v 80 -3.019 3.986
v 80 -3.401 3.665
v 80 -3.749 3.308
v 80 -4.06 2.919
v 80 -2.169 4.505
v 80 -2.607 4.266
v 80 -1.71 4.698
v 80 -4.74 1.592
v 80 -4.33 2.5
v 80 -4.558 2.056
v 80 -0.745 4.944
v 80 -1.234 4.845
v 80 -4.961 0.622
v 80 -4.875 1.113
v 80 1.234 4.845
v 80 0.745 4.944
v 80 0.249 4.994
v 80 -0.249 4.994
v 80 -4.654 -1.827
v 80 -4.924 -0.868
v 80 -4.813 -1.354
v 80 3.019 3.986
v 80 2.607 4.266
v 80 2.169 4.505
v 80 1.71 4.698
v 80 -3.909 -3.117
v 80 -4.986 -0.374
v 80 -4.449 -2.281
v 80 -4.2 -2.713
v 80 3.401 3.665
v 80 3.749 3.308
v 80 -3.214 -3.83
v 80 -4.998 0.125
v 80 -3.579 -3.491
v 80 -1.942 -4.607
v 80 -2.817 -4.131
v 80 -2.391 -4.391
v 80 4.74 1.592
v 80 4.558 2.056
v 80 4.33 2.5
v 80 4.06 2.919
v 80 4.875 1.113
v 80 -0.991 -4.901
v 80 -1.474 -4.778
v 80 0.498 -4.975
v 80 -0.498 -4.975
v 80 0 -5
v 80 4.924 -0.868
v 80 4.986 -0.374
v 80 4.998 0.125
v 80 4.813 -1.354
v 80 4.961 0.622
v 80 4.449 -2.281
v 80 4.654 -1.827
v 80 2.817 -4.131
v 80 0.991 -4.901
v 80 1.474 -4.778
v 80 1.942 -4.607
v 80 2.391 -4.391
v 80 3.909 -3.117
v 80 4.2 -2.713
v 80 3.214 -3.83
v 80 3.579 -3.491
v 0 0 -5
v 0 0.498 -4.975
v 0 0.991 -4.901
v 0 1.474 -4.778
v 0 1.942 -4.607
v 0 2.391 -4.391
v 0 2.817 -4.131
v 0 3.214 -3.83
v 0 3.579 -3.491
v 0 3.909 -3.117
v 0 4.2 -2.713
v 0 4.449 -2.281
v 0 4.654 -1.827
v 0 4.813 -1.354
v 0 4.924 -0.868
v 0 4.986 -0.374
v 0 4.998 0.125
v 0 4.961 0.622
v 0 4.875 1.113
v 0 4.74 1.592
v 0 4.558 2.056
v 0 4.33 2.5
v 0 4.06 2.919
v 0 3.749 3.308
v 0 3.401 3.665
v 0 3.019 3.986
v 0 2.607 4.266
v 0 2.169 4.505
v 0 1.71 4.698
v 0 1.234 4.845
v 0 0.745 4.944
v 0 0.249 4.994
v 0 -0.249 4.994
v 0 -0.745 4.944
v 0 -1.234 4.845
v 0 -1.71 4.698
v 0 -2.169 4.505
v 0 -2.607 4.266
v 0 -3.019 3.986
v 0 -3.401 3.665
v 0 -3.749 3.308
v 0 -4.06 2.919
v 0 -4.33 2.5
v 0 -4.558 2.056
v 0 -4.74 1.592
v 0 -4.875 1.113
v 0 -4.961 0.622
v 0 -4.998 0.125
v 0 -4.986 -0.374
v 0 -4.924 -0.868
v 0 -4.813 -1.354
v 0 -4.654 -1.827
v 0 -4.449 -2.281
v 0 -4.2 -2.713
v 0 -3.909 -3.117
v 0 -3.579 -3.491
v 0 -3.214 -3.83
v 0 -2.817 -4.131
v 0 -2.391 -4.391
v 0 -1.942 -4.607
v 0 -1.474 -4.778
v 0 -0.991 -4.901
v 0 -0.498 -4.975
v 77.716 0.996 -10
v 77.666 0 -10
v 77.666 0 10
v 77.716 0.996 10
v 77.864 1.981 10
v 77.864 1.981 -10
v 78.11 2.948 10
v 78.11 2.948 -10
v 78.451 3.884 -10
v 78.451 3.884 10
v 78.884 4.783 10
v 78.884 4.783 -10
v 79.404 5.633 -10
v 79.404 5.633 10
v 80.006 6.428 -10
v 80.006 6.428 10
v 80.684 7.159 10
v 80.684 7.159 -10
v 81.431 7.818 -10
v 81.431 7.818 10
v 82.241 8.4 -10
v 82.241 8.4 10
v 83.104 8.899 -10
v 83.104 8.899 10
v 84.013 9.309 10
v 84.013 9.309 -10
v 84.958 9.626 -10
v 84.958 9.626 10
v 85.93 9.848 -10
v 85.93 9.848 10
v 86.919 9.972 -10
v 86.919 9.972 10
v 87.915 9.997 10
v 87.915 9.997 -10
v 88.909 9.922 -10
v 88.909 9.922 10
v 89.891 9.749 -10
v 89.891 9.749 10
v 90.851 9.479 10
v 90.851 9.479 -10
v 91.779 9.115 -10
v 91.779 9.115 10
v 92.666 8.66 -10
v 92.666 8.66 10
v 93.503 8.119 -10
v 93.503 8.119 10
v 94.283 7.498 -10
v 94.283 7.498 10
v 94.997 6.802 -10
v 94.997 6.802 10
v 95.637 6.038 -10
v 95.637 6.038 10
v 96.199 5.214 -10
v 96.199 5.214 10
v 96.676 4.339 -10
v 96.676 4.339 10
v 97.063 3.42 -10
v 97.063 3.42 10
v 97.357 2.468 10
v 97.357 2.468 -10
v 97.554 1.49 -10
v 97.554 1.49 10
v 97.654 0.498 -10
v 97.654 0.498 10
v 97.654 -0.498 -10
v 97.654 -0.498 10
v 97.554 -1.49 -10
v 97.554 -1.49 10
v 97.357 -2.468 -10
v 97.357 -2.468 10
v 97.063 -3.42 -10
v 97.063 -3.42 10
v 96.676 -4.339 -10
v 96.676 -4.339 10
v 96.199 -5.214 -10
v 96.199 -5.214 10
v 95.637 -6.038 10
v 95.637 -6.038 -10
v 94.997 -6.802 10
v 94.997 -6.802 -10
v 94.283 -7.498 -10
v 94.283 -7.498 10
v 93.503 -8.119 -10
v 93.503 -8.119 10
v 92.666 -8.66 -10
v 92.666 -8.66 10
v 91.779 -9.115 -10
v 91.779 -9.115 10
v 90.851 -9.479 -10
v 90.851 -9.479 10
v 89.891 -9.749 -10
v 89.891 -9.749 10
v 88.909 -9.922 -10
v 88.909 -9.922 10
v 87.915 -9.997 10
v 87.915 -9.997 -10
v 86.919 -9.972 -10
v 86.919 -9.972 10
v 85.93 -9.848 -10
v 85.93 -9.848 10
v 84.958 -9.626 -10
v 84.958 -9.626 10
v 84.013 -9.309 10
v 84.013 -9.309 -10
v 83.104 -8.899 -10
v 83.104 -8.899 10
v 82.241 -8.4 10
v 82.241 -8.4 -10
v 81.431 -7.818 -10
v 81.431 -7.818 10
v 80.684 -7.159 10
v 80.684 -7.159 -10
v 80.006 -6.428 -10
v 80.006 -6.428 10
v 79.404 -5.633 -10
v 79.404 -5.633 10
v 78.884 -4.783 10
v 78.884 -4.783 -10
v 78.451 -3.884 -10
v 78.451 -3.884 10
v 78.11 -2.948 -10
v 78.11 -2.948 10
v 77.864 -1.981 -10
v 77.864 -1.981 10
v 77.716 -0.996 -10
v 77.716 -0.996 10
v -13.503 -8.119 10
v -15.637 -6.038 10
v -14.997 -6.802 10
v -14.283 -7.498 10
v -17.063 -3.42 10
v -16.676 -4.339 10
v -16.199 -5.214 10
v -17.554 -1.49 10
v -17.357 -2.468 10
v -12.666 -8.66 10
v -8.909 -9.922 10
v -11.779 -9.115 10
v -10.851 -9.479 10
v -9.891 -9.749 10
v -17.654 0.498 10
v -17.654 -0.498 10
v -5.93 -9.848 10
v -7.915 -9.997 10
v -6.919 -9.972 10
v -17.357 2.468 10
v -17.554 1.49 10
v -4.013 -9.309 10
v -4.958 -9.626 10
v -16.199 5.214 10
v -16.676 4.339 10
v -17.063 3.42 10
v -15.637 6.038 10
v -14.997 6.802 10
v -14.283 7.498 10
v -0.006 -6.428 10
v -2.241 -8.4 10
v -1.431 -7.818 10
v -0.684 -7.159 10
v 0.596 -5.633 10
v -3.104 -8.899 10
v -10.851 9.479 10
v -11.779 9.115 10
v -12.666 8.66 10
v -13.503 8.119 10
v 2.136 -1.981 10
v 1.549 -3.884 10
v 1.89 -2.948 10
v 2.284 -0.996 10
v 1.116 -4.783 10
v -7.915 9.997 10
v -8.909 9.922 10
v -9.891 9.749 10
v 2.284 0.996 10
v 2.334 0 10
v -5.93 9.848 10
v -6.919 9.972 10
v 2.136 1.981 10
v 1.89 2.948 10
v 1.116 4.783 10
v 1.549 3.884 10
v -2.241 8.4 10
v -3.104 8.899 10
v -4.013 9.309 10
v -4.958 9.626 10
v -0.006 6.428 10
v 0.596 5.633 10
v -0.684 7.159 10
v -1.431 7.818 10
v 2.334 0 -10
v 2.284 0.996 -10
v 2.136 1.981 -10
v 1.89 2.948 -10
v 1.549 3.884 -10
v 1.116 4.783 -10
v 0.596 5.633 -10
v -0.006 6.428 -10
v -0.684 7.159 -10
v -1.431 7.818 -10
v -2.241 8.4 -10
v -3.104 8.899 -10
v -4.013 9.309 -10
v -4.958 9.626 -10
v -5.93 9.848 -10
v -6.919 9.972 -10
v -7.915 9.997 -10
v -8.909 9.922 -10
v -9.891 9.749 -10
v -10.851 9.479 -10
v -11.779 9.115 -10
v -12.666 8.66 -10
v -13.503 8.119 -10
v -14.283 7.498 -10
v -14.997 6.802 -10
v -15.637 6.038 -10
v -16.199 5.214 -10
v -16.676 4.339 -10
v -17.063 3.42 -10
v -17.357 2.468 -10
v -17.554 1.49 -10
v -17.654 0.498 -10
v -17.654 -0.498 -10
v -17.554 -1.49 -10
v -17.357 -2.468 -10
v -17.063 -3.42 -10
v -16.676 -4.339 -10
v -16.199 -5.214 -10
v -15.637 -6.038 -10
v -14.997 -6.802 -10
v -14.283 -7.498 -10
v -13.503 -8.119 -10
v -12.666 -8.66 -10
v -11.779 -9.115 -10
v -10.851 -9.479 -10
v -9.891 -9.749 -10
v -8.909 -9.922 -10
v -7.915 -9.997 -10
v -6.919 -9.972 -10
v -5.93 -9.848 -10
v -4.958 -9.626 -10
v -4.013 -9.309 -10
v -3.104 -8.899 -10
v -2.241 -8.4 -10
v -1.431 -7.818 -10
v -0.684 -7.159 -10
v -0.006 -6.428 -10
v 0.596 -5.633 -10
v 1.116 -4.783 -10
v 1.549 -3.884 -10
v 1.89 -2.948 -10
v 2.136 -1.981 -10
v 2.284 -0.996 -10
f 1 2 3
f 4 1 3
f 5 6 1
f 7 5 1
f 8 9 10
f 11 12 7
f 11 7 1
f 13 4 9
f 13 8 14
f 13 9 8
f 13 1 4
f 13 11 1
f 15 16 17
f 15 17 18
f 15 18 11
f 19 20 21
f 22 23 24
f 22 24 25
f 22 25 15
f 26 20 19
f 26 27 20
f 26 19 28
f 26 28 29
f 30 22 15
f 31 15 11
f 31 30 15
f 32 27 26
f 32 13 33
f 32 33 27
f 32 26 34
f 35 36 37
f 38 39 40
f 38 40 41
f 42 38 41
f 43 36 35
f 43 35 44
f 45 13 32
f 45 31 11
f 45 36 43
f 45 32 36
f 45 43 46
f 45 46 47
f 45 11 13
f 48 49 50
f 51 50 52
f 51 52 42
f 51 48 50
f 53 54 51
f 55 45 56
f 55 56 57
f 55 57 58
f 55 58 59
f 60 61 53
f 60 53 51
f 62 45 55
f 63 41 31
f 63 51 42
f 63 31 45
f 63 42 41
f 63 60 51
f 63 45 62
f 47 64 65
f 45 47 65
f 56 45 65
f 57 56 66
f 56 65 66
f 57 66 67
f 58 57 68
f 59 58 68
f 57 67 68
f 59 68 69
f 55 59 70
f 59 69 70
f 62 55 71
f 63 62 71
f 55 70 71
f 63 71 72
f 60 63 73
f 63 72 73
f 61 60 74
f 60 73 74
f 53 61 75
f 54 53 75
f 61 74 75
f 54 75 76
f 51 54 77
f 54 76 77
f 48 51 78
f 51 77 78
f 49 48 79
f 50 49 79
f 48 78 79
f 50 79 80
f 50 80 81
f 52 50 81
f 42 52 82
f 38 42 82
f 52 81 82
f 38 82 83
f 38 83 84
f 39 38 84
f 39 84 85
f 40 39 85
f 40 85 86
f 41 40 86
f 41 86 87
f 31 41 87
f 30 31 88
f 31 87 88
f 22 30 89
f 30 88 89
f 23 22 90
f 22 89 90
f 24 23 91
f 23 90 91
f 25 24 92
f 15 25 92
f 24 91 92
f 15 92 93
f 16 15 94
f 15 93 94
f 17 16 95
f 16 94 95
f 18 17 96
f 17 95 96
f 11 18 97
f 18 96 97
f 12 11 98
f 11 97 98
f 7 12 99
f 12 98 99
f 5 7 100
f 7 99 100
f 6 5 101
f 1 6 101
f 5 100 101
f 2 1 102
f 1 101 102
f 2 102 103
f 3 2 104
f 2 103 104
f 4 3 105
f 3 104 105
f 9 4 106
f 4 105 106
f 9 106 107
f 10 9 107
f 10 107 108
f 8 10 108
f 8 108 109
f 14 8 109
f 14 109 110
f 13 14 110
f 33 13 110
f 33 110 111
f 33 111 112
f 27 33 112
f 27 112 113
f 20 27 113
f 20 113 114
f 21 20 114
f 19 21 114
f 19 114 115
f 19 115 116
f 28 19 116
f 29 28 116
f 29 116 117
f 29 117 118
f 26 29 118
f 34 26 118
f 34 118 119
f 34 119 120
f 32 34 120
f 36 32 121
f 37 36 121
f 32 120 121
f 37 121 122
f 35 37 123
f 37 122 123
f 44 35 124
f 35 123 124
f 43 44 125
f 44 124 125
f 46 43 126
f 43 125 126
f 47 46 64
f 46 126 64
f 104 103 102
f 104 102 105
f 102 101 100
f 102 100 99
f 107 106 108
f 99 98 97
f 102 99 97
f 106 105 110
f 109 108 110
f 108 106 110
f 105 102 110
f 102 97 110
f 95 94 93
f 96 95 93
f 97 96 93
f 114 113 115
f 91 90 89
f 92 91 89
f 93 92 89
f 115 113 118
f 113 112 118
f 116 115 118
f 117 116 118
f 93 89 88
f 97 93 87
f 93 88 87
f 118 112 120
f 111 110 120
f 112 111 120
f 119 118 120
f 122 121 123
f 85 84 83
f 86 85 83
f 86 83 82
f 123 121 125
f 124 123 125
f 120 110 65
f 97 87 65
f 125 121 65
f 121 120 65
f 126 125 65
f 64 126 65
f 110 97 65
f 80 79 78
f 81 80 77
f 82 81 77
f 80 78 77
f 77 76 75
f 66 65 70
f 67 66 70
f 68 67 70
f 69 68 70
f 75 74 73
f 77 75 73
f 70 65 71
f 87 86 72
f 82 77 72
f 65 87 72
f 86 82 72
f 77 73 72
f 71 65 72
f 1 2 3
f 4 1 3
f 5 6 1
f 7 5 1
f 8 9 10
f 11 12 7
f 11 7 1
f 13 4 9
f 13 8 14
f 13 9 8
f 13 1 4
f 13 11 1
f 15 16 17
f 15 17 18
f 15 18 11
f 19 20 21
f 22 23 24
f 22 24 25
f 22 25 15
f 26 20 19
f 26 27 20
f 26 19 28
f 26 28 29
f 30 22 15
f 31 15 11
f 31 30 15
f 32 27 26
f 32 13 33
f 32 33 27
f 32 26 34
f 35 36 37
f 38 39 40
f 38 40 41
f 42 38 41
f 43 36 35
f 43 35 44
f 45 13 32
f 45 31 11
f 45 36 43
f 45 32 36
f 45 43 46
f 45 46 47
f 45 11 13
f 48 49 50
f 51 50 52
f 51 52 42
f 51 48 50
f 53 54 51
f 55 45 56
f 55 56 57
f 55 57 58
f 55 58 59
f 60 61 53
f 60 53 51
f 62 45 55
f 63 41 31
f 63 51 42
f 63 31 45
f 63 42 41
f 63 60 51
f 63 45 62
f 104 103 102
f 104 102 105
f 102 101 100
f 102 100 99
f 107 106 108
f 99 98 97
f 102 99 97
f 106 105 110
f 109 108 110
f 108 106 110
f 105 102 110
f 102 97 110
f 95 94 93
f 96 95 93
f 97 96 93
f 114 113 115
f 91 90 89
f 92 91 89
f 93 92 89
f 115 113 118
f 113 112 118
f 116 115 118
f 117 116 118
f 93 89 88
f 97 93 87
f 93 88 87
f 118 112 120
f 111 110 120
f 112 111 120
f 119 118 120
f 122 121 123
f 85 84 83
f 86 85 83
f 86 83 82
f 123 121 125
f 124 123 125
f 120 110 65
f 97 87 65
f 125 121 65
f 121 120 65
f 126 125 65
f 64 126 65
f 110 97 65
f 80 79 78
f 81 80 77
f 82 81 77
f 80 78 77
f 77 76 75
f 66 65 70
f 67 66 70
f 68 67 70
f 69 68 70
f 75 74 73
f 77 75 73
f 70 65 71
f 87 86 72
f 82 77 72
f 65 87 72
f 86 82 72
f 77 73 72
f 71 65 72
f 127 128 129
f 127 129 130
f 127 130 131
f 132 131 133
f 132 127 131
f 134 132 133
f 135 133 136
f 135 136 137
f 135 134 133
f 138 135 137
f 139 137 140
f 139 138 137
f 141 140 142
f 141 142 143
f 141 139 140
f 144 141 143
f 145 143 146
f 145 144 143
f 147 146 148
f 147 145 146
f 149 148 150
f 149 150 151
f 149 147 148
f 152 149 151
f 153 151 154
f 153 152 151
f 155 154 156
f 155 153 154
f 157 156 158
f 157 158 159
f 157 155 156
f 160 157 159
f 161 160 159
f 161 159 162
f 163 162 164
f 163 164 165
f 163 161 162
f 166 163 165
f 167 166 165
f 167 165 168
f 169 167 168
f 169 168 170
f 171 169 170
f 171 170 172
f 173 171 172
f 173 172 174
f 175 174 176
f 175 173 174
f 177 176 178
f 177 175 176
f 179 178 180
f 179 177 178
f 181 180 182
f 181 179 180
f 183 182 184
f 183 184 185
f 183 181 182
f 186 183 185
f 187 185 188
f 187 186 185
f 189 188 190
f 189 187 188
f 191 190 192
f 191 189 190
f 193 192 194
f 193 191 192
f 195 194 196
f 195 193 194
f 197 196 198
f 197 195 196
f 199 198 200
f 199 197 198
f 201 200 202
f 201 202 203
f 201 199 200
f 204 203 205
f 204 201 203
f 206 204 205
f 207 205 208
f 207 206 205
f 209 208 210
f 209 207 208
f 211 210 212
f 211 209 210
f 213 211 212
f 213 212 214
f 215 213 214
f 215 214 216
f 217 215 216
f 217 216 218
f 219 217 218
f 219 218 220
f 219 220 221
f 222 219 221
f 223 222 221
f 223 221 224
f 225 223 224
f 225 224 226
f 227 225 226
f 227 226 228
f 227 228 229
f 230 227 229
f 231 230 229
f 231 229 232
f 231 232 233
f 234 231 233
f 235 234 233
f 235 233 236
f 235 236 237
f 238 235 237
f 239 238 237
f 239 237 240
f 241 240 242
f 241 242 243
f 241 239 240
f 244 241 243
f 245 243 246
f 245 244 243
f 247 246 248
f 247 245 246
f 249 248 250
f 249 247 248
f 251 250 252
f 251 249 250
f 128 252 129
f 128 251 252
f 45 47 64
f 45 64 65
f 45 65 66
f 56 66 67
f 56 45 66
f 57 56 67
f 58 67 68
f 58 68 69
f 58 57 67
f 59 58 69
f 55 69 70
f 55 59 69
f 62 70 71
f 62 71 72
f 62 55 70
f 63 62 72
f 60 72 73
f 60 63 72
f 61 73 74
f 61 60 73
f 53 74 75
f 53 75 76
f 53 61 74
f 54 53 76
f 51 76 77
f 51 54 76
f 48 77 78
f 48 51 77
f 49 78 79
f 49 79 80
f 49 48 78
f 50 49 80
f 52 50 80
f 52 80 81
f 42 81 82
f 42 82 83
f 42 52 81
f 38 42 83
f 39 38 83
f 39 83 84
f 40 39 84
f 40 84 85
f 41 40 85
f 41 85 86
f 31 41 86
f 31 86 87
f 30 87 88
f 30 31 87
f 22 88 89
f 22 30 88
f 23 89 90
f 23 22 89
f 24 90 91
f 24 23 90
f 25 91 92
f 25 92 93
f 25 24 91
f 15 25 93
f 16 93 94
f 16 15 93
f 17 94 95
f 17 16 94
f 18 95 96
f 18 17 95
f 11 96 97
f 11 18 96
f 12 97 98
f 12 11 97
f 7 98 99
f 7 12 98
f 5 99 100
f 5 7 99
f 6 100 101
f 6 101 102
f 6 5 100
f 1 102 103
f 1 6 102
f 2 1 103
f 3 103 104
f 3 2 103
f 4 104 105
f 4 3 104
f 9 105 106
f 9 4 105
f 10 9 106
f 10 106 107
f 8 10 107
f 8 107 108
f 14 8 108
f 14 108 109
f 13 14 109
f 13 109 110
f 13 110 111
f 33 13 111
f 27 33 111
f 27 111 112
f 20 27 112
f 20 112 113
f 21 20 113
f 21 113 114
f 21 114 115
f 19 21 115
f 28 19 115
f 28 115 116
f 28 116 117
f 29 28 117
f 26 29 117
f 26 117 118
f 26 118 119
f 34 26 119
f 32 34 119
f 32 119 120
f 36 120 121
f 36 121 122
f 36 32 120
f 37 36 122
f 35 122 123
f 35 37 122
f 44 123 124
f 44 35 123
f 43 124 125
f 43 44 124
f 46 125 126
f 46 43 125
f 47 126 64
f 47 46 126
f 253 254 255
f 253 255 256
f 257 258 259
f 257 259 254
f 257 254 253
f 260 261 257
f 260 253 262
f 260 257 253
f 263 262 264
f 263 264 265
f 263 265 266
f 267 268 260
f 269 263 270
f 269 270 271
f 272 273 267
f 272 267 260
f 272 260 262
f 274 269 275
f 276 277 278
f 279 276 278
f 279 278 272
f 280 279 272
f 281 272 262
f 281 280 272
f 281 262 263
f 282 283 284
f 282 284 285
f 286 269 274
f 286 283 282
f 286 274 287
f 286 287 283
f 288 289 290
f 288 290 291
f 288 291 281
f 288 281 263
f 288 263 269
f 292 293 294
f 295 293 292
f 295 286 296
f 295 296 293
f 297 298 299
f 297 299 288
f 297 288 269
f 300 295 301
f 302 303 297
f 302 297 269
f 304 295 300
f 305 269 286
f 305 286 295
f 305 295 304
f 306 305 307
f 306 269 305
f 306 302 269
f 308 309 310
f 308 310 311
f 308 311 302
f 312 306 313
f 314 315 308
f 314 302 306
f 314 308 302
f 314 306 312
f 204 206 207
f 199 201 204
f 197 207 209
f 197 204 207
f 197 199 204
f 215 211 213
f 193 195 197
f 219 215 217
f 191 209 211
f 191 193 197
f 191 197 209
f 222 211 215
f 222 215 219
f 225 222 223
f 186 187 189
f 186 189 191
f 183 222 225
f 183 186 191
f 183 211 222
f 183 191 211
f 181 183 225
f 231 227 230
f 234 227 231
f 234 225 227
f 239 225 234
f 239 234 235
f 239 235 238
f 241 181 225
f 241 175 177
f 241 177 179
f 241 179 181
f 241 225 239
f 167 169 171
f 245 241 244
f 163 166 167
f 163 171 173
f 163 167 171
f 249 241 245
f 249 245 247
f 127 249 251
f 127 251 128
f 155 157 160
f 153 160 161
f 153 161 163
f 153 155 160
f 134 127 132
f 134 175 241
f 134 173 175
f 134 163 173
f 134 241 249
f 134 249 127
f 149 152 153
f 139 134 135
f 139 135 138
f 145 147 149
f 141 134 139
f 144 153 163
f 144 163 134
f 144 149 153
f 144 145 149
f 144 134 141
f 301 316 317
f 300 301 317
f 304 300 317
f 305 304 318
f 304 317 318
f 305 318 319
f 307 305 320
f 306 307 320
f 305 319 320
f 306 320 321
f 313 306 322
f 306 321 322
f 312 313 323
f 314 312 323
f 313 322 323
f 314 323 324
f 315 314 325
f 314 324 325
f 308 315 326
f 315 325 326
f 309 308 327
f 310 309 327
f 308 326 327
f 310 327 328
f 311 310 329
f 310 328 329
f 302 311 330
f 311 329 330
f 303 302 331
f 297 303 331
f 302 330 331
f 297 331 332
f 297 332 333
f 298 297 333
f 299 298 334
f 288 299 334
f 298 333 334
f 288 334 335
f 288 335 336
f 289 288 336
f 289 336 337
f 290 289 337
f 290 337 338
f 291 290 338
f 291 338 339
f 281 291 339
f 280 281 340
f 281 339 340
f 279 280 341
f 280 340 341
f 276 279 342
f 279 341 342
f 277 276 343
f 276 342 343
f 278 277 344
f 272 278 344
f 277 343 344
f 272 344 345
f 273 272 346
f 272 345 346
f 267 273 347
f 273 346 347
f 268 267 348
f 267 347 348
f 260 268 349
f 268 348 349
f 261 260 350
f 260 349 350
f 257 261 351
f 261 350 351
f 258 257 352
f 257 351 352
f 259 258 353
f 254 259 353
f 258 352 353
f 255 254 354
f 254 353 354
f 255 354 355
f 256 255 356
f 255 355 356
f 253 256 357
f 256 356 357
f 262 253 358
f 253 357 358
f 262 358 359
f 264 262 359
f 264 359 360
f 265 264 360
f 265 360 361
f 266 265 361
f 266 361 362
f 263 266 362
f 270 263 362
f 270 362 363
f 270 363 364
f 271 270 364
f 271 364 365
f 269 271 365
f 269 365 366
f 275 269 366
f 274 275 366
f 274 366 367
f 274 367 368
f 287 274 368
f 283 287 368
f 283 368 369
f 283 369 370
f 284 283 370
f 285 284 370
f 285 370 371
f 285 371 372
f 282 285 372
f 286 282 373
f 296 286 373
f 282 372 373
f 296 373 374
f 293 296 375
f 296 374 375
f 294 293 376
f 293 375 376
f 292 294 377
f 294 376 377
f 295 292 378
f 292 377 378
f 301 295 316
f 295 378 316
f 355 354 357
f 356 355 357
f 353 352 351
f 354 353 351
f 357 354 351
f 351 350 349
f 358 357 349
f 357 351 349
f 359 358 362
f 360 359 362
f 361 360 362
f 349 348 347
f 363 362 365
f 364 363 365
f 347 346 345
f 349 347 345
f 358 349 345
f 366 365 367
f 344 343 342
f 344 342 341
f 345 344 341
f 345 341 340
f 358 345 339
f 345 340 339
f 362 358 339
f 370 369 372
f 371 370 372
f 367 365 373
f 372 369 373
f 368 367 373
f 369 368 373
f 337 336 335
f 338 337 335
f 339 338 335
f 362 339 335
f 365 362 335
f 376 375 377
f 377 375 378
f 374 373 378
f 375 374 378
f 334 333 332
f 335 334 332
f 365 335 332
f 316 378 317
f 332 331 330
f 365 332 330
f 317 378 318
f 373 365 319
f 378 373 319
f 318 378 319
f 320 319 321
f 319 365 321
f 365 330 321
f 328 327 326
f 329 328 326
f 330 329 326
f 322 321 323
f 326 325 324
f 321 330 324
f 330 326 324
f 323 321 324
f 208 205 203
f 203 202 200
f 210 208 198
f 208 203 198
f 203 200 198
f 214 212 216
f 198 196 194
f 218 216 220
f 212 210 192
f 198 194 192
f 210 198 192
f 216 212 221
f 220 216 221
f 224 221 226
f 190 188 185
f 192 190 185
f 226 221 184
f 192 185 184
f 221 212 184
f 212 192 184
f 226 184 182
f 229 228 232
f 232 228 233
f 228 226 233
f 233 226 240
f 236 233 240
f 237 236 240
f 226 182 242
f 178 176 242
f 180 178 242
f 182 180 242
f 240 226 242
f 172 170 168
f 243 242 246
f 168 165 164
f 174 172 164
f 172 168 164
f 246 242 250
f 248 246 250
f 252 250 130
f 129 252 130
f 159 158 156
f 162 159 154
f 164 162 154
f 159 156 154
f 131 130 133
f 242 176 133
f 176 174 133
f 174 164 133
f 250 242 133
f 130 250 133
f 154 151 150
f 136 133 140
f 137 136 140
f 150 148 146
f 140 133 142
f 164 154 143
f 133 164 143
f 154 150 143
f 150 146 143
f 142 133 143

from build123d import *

# Parameters (mm, degrees)
SKETCH1_R                = 5
BOSS_EXTRUDE1_DEPTH      = 80
BOSS_EXTRUDE2_DEPTH      = 10
BOSS_EXTRUDE2_DEPTH_BACK = 10
SKETCH2_R                = 10


with BuildPart() as part:
    # Sketch1 → Boss-Extrude1 (new body)
    with BuildSketch(Plane(origin=(0, 0, 0), x_dir=(0, 0, -1), z_dir=(1, 0, 0))):
        Circle(SKETCH1_R)
    extrude(amount=BOSS_EXTRUDE1_DEPTH)


with BuildPart() as body_2:
    # Sketch2 → Boss-Extrude2 (new, two sides: drawn at the far end of the back side and taken through both)
    with BuildSketch(Plane.XY.offset(-BOSS_EXTRUDE2_DEPTH_BACK)):
        with Locations((-7.666034923, 0)):
            Circle(SKETCH2_R)
    extrude(amount=BOSS_EXTRUDE2_DEPTH + BOSS_EXTRUDE2_DEPTH_BACK)


with BuildPart() as body_3:
    # Mirror1: mirrored copy
    add(part.part.mirror(Plane.ZX.offset(-224)))


with BuildPart() as body_4:
    # Mirror1 2: mirrored copy
    add(body_2.part.mirror(Plane.ZX.offset(-224)))


with BuildPart() as body_5:
    # Mirror2: mirrored copy
    add(part.part.mirror(Plane.ZY.offset(-40)))


with BuildPart() as body_6:
    # Mirror2 2: mirrored copy
    add(body_3.part.mirror(Plane.ZY.offset(-40)))


with BuildPart() as body_7:
    # Mirror2 3: mirrored copy
    add(body_4.part.mirror(Plane.ZY.offset(-40)))


with BuildPart() as body_8:
    # Mirror2 4: mirrored copy
    add(body_2.part.mirror(Plane.ZY.offset(-40)))


solid = Compound([part.part, body_2.part, body_5.part, body_8.part])
